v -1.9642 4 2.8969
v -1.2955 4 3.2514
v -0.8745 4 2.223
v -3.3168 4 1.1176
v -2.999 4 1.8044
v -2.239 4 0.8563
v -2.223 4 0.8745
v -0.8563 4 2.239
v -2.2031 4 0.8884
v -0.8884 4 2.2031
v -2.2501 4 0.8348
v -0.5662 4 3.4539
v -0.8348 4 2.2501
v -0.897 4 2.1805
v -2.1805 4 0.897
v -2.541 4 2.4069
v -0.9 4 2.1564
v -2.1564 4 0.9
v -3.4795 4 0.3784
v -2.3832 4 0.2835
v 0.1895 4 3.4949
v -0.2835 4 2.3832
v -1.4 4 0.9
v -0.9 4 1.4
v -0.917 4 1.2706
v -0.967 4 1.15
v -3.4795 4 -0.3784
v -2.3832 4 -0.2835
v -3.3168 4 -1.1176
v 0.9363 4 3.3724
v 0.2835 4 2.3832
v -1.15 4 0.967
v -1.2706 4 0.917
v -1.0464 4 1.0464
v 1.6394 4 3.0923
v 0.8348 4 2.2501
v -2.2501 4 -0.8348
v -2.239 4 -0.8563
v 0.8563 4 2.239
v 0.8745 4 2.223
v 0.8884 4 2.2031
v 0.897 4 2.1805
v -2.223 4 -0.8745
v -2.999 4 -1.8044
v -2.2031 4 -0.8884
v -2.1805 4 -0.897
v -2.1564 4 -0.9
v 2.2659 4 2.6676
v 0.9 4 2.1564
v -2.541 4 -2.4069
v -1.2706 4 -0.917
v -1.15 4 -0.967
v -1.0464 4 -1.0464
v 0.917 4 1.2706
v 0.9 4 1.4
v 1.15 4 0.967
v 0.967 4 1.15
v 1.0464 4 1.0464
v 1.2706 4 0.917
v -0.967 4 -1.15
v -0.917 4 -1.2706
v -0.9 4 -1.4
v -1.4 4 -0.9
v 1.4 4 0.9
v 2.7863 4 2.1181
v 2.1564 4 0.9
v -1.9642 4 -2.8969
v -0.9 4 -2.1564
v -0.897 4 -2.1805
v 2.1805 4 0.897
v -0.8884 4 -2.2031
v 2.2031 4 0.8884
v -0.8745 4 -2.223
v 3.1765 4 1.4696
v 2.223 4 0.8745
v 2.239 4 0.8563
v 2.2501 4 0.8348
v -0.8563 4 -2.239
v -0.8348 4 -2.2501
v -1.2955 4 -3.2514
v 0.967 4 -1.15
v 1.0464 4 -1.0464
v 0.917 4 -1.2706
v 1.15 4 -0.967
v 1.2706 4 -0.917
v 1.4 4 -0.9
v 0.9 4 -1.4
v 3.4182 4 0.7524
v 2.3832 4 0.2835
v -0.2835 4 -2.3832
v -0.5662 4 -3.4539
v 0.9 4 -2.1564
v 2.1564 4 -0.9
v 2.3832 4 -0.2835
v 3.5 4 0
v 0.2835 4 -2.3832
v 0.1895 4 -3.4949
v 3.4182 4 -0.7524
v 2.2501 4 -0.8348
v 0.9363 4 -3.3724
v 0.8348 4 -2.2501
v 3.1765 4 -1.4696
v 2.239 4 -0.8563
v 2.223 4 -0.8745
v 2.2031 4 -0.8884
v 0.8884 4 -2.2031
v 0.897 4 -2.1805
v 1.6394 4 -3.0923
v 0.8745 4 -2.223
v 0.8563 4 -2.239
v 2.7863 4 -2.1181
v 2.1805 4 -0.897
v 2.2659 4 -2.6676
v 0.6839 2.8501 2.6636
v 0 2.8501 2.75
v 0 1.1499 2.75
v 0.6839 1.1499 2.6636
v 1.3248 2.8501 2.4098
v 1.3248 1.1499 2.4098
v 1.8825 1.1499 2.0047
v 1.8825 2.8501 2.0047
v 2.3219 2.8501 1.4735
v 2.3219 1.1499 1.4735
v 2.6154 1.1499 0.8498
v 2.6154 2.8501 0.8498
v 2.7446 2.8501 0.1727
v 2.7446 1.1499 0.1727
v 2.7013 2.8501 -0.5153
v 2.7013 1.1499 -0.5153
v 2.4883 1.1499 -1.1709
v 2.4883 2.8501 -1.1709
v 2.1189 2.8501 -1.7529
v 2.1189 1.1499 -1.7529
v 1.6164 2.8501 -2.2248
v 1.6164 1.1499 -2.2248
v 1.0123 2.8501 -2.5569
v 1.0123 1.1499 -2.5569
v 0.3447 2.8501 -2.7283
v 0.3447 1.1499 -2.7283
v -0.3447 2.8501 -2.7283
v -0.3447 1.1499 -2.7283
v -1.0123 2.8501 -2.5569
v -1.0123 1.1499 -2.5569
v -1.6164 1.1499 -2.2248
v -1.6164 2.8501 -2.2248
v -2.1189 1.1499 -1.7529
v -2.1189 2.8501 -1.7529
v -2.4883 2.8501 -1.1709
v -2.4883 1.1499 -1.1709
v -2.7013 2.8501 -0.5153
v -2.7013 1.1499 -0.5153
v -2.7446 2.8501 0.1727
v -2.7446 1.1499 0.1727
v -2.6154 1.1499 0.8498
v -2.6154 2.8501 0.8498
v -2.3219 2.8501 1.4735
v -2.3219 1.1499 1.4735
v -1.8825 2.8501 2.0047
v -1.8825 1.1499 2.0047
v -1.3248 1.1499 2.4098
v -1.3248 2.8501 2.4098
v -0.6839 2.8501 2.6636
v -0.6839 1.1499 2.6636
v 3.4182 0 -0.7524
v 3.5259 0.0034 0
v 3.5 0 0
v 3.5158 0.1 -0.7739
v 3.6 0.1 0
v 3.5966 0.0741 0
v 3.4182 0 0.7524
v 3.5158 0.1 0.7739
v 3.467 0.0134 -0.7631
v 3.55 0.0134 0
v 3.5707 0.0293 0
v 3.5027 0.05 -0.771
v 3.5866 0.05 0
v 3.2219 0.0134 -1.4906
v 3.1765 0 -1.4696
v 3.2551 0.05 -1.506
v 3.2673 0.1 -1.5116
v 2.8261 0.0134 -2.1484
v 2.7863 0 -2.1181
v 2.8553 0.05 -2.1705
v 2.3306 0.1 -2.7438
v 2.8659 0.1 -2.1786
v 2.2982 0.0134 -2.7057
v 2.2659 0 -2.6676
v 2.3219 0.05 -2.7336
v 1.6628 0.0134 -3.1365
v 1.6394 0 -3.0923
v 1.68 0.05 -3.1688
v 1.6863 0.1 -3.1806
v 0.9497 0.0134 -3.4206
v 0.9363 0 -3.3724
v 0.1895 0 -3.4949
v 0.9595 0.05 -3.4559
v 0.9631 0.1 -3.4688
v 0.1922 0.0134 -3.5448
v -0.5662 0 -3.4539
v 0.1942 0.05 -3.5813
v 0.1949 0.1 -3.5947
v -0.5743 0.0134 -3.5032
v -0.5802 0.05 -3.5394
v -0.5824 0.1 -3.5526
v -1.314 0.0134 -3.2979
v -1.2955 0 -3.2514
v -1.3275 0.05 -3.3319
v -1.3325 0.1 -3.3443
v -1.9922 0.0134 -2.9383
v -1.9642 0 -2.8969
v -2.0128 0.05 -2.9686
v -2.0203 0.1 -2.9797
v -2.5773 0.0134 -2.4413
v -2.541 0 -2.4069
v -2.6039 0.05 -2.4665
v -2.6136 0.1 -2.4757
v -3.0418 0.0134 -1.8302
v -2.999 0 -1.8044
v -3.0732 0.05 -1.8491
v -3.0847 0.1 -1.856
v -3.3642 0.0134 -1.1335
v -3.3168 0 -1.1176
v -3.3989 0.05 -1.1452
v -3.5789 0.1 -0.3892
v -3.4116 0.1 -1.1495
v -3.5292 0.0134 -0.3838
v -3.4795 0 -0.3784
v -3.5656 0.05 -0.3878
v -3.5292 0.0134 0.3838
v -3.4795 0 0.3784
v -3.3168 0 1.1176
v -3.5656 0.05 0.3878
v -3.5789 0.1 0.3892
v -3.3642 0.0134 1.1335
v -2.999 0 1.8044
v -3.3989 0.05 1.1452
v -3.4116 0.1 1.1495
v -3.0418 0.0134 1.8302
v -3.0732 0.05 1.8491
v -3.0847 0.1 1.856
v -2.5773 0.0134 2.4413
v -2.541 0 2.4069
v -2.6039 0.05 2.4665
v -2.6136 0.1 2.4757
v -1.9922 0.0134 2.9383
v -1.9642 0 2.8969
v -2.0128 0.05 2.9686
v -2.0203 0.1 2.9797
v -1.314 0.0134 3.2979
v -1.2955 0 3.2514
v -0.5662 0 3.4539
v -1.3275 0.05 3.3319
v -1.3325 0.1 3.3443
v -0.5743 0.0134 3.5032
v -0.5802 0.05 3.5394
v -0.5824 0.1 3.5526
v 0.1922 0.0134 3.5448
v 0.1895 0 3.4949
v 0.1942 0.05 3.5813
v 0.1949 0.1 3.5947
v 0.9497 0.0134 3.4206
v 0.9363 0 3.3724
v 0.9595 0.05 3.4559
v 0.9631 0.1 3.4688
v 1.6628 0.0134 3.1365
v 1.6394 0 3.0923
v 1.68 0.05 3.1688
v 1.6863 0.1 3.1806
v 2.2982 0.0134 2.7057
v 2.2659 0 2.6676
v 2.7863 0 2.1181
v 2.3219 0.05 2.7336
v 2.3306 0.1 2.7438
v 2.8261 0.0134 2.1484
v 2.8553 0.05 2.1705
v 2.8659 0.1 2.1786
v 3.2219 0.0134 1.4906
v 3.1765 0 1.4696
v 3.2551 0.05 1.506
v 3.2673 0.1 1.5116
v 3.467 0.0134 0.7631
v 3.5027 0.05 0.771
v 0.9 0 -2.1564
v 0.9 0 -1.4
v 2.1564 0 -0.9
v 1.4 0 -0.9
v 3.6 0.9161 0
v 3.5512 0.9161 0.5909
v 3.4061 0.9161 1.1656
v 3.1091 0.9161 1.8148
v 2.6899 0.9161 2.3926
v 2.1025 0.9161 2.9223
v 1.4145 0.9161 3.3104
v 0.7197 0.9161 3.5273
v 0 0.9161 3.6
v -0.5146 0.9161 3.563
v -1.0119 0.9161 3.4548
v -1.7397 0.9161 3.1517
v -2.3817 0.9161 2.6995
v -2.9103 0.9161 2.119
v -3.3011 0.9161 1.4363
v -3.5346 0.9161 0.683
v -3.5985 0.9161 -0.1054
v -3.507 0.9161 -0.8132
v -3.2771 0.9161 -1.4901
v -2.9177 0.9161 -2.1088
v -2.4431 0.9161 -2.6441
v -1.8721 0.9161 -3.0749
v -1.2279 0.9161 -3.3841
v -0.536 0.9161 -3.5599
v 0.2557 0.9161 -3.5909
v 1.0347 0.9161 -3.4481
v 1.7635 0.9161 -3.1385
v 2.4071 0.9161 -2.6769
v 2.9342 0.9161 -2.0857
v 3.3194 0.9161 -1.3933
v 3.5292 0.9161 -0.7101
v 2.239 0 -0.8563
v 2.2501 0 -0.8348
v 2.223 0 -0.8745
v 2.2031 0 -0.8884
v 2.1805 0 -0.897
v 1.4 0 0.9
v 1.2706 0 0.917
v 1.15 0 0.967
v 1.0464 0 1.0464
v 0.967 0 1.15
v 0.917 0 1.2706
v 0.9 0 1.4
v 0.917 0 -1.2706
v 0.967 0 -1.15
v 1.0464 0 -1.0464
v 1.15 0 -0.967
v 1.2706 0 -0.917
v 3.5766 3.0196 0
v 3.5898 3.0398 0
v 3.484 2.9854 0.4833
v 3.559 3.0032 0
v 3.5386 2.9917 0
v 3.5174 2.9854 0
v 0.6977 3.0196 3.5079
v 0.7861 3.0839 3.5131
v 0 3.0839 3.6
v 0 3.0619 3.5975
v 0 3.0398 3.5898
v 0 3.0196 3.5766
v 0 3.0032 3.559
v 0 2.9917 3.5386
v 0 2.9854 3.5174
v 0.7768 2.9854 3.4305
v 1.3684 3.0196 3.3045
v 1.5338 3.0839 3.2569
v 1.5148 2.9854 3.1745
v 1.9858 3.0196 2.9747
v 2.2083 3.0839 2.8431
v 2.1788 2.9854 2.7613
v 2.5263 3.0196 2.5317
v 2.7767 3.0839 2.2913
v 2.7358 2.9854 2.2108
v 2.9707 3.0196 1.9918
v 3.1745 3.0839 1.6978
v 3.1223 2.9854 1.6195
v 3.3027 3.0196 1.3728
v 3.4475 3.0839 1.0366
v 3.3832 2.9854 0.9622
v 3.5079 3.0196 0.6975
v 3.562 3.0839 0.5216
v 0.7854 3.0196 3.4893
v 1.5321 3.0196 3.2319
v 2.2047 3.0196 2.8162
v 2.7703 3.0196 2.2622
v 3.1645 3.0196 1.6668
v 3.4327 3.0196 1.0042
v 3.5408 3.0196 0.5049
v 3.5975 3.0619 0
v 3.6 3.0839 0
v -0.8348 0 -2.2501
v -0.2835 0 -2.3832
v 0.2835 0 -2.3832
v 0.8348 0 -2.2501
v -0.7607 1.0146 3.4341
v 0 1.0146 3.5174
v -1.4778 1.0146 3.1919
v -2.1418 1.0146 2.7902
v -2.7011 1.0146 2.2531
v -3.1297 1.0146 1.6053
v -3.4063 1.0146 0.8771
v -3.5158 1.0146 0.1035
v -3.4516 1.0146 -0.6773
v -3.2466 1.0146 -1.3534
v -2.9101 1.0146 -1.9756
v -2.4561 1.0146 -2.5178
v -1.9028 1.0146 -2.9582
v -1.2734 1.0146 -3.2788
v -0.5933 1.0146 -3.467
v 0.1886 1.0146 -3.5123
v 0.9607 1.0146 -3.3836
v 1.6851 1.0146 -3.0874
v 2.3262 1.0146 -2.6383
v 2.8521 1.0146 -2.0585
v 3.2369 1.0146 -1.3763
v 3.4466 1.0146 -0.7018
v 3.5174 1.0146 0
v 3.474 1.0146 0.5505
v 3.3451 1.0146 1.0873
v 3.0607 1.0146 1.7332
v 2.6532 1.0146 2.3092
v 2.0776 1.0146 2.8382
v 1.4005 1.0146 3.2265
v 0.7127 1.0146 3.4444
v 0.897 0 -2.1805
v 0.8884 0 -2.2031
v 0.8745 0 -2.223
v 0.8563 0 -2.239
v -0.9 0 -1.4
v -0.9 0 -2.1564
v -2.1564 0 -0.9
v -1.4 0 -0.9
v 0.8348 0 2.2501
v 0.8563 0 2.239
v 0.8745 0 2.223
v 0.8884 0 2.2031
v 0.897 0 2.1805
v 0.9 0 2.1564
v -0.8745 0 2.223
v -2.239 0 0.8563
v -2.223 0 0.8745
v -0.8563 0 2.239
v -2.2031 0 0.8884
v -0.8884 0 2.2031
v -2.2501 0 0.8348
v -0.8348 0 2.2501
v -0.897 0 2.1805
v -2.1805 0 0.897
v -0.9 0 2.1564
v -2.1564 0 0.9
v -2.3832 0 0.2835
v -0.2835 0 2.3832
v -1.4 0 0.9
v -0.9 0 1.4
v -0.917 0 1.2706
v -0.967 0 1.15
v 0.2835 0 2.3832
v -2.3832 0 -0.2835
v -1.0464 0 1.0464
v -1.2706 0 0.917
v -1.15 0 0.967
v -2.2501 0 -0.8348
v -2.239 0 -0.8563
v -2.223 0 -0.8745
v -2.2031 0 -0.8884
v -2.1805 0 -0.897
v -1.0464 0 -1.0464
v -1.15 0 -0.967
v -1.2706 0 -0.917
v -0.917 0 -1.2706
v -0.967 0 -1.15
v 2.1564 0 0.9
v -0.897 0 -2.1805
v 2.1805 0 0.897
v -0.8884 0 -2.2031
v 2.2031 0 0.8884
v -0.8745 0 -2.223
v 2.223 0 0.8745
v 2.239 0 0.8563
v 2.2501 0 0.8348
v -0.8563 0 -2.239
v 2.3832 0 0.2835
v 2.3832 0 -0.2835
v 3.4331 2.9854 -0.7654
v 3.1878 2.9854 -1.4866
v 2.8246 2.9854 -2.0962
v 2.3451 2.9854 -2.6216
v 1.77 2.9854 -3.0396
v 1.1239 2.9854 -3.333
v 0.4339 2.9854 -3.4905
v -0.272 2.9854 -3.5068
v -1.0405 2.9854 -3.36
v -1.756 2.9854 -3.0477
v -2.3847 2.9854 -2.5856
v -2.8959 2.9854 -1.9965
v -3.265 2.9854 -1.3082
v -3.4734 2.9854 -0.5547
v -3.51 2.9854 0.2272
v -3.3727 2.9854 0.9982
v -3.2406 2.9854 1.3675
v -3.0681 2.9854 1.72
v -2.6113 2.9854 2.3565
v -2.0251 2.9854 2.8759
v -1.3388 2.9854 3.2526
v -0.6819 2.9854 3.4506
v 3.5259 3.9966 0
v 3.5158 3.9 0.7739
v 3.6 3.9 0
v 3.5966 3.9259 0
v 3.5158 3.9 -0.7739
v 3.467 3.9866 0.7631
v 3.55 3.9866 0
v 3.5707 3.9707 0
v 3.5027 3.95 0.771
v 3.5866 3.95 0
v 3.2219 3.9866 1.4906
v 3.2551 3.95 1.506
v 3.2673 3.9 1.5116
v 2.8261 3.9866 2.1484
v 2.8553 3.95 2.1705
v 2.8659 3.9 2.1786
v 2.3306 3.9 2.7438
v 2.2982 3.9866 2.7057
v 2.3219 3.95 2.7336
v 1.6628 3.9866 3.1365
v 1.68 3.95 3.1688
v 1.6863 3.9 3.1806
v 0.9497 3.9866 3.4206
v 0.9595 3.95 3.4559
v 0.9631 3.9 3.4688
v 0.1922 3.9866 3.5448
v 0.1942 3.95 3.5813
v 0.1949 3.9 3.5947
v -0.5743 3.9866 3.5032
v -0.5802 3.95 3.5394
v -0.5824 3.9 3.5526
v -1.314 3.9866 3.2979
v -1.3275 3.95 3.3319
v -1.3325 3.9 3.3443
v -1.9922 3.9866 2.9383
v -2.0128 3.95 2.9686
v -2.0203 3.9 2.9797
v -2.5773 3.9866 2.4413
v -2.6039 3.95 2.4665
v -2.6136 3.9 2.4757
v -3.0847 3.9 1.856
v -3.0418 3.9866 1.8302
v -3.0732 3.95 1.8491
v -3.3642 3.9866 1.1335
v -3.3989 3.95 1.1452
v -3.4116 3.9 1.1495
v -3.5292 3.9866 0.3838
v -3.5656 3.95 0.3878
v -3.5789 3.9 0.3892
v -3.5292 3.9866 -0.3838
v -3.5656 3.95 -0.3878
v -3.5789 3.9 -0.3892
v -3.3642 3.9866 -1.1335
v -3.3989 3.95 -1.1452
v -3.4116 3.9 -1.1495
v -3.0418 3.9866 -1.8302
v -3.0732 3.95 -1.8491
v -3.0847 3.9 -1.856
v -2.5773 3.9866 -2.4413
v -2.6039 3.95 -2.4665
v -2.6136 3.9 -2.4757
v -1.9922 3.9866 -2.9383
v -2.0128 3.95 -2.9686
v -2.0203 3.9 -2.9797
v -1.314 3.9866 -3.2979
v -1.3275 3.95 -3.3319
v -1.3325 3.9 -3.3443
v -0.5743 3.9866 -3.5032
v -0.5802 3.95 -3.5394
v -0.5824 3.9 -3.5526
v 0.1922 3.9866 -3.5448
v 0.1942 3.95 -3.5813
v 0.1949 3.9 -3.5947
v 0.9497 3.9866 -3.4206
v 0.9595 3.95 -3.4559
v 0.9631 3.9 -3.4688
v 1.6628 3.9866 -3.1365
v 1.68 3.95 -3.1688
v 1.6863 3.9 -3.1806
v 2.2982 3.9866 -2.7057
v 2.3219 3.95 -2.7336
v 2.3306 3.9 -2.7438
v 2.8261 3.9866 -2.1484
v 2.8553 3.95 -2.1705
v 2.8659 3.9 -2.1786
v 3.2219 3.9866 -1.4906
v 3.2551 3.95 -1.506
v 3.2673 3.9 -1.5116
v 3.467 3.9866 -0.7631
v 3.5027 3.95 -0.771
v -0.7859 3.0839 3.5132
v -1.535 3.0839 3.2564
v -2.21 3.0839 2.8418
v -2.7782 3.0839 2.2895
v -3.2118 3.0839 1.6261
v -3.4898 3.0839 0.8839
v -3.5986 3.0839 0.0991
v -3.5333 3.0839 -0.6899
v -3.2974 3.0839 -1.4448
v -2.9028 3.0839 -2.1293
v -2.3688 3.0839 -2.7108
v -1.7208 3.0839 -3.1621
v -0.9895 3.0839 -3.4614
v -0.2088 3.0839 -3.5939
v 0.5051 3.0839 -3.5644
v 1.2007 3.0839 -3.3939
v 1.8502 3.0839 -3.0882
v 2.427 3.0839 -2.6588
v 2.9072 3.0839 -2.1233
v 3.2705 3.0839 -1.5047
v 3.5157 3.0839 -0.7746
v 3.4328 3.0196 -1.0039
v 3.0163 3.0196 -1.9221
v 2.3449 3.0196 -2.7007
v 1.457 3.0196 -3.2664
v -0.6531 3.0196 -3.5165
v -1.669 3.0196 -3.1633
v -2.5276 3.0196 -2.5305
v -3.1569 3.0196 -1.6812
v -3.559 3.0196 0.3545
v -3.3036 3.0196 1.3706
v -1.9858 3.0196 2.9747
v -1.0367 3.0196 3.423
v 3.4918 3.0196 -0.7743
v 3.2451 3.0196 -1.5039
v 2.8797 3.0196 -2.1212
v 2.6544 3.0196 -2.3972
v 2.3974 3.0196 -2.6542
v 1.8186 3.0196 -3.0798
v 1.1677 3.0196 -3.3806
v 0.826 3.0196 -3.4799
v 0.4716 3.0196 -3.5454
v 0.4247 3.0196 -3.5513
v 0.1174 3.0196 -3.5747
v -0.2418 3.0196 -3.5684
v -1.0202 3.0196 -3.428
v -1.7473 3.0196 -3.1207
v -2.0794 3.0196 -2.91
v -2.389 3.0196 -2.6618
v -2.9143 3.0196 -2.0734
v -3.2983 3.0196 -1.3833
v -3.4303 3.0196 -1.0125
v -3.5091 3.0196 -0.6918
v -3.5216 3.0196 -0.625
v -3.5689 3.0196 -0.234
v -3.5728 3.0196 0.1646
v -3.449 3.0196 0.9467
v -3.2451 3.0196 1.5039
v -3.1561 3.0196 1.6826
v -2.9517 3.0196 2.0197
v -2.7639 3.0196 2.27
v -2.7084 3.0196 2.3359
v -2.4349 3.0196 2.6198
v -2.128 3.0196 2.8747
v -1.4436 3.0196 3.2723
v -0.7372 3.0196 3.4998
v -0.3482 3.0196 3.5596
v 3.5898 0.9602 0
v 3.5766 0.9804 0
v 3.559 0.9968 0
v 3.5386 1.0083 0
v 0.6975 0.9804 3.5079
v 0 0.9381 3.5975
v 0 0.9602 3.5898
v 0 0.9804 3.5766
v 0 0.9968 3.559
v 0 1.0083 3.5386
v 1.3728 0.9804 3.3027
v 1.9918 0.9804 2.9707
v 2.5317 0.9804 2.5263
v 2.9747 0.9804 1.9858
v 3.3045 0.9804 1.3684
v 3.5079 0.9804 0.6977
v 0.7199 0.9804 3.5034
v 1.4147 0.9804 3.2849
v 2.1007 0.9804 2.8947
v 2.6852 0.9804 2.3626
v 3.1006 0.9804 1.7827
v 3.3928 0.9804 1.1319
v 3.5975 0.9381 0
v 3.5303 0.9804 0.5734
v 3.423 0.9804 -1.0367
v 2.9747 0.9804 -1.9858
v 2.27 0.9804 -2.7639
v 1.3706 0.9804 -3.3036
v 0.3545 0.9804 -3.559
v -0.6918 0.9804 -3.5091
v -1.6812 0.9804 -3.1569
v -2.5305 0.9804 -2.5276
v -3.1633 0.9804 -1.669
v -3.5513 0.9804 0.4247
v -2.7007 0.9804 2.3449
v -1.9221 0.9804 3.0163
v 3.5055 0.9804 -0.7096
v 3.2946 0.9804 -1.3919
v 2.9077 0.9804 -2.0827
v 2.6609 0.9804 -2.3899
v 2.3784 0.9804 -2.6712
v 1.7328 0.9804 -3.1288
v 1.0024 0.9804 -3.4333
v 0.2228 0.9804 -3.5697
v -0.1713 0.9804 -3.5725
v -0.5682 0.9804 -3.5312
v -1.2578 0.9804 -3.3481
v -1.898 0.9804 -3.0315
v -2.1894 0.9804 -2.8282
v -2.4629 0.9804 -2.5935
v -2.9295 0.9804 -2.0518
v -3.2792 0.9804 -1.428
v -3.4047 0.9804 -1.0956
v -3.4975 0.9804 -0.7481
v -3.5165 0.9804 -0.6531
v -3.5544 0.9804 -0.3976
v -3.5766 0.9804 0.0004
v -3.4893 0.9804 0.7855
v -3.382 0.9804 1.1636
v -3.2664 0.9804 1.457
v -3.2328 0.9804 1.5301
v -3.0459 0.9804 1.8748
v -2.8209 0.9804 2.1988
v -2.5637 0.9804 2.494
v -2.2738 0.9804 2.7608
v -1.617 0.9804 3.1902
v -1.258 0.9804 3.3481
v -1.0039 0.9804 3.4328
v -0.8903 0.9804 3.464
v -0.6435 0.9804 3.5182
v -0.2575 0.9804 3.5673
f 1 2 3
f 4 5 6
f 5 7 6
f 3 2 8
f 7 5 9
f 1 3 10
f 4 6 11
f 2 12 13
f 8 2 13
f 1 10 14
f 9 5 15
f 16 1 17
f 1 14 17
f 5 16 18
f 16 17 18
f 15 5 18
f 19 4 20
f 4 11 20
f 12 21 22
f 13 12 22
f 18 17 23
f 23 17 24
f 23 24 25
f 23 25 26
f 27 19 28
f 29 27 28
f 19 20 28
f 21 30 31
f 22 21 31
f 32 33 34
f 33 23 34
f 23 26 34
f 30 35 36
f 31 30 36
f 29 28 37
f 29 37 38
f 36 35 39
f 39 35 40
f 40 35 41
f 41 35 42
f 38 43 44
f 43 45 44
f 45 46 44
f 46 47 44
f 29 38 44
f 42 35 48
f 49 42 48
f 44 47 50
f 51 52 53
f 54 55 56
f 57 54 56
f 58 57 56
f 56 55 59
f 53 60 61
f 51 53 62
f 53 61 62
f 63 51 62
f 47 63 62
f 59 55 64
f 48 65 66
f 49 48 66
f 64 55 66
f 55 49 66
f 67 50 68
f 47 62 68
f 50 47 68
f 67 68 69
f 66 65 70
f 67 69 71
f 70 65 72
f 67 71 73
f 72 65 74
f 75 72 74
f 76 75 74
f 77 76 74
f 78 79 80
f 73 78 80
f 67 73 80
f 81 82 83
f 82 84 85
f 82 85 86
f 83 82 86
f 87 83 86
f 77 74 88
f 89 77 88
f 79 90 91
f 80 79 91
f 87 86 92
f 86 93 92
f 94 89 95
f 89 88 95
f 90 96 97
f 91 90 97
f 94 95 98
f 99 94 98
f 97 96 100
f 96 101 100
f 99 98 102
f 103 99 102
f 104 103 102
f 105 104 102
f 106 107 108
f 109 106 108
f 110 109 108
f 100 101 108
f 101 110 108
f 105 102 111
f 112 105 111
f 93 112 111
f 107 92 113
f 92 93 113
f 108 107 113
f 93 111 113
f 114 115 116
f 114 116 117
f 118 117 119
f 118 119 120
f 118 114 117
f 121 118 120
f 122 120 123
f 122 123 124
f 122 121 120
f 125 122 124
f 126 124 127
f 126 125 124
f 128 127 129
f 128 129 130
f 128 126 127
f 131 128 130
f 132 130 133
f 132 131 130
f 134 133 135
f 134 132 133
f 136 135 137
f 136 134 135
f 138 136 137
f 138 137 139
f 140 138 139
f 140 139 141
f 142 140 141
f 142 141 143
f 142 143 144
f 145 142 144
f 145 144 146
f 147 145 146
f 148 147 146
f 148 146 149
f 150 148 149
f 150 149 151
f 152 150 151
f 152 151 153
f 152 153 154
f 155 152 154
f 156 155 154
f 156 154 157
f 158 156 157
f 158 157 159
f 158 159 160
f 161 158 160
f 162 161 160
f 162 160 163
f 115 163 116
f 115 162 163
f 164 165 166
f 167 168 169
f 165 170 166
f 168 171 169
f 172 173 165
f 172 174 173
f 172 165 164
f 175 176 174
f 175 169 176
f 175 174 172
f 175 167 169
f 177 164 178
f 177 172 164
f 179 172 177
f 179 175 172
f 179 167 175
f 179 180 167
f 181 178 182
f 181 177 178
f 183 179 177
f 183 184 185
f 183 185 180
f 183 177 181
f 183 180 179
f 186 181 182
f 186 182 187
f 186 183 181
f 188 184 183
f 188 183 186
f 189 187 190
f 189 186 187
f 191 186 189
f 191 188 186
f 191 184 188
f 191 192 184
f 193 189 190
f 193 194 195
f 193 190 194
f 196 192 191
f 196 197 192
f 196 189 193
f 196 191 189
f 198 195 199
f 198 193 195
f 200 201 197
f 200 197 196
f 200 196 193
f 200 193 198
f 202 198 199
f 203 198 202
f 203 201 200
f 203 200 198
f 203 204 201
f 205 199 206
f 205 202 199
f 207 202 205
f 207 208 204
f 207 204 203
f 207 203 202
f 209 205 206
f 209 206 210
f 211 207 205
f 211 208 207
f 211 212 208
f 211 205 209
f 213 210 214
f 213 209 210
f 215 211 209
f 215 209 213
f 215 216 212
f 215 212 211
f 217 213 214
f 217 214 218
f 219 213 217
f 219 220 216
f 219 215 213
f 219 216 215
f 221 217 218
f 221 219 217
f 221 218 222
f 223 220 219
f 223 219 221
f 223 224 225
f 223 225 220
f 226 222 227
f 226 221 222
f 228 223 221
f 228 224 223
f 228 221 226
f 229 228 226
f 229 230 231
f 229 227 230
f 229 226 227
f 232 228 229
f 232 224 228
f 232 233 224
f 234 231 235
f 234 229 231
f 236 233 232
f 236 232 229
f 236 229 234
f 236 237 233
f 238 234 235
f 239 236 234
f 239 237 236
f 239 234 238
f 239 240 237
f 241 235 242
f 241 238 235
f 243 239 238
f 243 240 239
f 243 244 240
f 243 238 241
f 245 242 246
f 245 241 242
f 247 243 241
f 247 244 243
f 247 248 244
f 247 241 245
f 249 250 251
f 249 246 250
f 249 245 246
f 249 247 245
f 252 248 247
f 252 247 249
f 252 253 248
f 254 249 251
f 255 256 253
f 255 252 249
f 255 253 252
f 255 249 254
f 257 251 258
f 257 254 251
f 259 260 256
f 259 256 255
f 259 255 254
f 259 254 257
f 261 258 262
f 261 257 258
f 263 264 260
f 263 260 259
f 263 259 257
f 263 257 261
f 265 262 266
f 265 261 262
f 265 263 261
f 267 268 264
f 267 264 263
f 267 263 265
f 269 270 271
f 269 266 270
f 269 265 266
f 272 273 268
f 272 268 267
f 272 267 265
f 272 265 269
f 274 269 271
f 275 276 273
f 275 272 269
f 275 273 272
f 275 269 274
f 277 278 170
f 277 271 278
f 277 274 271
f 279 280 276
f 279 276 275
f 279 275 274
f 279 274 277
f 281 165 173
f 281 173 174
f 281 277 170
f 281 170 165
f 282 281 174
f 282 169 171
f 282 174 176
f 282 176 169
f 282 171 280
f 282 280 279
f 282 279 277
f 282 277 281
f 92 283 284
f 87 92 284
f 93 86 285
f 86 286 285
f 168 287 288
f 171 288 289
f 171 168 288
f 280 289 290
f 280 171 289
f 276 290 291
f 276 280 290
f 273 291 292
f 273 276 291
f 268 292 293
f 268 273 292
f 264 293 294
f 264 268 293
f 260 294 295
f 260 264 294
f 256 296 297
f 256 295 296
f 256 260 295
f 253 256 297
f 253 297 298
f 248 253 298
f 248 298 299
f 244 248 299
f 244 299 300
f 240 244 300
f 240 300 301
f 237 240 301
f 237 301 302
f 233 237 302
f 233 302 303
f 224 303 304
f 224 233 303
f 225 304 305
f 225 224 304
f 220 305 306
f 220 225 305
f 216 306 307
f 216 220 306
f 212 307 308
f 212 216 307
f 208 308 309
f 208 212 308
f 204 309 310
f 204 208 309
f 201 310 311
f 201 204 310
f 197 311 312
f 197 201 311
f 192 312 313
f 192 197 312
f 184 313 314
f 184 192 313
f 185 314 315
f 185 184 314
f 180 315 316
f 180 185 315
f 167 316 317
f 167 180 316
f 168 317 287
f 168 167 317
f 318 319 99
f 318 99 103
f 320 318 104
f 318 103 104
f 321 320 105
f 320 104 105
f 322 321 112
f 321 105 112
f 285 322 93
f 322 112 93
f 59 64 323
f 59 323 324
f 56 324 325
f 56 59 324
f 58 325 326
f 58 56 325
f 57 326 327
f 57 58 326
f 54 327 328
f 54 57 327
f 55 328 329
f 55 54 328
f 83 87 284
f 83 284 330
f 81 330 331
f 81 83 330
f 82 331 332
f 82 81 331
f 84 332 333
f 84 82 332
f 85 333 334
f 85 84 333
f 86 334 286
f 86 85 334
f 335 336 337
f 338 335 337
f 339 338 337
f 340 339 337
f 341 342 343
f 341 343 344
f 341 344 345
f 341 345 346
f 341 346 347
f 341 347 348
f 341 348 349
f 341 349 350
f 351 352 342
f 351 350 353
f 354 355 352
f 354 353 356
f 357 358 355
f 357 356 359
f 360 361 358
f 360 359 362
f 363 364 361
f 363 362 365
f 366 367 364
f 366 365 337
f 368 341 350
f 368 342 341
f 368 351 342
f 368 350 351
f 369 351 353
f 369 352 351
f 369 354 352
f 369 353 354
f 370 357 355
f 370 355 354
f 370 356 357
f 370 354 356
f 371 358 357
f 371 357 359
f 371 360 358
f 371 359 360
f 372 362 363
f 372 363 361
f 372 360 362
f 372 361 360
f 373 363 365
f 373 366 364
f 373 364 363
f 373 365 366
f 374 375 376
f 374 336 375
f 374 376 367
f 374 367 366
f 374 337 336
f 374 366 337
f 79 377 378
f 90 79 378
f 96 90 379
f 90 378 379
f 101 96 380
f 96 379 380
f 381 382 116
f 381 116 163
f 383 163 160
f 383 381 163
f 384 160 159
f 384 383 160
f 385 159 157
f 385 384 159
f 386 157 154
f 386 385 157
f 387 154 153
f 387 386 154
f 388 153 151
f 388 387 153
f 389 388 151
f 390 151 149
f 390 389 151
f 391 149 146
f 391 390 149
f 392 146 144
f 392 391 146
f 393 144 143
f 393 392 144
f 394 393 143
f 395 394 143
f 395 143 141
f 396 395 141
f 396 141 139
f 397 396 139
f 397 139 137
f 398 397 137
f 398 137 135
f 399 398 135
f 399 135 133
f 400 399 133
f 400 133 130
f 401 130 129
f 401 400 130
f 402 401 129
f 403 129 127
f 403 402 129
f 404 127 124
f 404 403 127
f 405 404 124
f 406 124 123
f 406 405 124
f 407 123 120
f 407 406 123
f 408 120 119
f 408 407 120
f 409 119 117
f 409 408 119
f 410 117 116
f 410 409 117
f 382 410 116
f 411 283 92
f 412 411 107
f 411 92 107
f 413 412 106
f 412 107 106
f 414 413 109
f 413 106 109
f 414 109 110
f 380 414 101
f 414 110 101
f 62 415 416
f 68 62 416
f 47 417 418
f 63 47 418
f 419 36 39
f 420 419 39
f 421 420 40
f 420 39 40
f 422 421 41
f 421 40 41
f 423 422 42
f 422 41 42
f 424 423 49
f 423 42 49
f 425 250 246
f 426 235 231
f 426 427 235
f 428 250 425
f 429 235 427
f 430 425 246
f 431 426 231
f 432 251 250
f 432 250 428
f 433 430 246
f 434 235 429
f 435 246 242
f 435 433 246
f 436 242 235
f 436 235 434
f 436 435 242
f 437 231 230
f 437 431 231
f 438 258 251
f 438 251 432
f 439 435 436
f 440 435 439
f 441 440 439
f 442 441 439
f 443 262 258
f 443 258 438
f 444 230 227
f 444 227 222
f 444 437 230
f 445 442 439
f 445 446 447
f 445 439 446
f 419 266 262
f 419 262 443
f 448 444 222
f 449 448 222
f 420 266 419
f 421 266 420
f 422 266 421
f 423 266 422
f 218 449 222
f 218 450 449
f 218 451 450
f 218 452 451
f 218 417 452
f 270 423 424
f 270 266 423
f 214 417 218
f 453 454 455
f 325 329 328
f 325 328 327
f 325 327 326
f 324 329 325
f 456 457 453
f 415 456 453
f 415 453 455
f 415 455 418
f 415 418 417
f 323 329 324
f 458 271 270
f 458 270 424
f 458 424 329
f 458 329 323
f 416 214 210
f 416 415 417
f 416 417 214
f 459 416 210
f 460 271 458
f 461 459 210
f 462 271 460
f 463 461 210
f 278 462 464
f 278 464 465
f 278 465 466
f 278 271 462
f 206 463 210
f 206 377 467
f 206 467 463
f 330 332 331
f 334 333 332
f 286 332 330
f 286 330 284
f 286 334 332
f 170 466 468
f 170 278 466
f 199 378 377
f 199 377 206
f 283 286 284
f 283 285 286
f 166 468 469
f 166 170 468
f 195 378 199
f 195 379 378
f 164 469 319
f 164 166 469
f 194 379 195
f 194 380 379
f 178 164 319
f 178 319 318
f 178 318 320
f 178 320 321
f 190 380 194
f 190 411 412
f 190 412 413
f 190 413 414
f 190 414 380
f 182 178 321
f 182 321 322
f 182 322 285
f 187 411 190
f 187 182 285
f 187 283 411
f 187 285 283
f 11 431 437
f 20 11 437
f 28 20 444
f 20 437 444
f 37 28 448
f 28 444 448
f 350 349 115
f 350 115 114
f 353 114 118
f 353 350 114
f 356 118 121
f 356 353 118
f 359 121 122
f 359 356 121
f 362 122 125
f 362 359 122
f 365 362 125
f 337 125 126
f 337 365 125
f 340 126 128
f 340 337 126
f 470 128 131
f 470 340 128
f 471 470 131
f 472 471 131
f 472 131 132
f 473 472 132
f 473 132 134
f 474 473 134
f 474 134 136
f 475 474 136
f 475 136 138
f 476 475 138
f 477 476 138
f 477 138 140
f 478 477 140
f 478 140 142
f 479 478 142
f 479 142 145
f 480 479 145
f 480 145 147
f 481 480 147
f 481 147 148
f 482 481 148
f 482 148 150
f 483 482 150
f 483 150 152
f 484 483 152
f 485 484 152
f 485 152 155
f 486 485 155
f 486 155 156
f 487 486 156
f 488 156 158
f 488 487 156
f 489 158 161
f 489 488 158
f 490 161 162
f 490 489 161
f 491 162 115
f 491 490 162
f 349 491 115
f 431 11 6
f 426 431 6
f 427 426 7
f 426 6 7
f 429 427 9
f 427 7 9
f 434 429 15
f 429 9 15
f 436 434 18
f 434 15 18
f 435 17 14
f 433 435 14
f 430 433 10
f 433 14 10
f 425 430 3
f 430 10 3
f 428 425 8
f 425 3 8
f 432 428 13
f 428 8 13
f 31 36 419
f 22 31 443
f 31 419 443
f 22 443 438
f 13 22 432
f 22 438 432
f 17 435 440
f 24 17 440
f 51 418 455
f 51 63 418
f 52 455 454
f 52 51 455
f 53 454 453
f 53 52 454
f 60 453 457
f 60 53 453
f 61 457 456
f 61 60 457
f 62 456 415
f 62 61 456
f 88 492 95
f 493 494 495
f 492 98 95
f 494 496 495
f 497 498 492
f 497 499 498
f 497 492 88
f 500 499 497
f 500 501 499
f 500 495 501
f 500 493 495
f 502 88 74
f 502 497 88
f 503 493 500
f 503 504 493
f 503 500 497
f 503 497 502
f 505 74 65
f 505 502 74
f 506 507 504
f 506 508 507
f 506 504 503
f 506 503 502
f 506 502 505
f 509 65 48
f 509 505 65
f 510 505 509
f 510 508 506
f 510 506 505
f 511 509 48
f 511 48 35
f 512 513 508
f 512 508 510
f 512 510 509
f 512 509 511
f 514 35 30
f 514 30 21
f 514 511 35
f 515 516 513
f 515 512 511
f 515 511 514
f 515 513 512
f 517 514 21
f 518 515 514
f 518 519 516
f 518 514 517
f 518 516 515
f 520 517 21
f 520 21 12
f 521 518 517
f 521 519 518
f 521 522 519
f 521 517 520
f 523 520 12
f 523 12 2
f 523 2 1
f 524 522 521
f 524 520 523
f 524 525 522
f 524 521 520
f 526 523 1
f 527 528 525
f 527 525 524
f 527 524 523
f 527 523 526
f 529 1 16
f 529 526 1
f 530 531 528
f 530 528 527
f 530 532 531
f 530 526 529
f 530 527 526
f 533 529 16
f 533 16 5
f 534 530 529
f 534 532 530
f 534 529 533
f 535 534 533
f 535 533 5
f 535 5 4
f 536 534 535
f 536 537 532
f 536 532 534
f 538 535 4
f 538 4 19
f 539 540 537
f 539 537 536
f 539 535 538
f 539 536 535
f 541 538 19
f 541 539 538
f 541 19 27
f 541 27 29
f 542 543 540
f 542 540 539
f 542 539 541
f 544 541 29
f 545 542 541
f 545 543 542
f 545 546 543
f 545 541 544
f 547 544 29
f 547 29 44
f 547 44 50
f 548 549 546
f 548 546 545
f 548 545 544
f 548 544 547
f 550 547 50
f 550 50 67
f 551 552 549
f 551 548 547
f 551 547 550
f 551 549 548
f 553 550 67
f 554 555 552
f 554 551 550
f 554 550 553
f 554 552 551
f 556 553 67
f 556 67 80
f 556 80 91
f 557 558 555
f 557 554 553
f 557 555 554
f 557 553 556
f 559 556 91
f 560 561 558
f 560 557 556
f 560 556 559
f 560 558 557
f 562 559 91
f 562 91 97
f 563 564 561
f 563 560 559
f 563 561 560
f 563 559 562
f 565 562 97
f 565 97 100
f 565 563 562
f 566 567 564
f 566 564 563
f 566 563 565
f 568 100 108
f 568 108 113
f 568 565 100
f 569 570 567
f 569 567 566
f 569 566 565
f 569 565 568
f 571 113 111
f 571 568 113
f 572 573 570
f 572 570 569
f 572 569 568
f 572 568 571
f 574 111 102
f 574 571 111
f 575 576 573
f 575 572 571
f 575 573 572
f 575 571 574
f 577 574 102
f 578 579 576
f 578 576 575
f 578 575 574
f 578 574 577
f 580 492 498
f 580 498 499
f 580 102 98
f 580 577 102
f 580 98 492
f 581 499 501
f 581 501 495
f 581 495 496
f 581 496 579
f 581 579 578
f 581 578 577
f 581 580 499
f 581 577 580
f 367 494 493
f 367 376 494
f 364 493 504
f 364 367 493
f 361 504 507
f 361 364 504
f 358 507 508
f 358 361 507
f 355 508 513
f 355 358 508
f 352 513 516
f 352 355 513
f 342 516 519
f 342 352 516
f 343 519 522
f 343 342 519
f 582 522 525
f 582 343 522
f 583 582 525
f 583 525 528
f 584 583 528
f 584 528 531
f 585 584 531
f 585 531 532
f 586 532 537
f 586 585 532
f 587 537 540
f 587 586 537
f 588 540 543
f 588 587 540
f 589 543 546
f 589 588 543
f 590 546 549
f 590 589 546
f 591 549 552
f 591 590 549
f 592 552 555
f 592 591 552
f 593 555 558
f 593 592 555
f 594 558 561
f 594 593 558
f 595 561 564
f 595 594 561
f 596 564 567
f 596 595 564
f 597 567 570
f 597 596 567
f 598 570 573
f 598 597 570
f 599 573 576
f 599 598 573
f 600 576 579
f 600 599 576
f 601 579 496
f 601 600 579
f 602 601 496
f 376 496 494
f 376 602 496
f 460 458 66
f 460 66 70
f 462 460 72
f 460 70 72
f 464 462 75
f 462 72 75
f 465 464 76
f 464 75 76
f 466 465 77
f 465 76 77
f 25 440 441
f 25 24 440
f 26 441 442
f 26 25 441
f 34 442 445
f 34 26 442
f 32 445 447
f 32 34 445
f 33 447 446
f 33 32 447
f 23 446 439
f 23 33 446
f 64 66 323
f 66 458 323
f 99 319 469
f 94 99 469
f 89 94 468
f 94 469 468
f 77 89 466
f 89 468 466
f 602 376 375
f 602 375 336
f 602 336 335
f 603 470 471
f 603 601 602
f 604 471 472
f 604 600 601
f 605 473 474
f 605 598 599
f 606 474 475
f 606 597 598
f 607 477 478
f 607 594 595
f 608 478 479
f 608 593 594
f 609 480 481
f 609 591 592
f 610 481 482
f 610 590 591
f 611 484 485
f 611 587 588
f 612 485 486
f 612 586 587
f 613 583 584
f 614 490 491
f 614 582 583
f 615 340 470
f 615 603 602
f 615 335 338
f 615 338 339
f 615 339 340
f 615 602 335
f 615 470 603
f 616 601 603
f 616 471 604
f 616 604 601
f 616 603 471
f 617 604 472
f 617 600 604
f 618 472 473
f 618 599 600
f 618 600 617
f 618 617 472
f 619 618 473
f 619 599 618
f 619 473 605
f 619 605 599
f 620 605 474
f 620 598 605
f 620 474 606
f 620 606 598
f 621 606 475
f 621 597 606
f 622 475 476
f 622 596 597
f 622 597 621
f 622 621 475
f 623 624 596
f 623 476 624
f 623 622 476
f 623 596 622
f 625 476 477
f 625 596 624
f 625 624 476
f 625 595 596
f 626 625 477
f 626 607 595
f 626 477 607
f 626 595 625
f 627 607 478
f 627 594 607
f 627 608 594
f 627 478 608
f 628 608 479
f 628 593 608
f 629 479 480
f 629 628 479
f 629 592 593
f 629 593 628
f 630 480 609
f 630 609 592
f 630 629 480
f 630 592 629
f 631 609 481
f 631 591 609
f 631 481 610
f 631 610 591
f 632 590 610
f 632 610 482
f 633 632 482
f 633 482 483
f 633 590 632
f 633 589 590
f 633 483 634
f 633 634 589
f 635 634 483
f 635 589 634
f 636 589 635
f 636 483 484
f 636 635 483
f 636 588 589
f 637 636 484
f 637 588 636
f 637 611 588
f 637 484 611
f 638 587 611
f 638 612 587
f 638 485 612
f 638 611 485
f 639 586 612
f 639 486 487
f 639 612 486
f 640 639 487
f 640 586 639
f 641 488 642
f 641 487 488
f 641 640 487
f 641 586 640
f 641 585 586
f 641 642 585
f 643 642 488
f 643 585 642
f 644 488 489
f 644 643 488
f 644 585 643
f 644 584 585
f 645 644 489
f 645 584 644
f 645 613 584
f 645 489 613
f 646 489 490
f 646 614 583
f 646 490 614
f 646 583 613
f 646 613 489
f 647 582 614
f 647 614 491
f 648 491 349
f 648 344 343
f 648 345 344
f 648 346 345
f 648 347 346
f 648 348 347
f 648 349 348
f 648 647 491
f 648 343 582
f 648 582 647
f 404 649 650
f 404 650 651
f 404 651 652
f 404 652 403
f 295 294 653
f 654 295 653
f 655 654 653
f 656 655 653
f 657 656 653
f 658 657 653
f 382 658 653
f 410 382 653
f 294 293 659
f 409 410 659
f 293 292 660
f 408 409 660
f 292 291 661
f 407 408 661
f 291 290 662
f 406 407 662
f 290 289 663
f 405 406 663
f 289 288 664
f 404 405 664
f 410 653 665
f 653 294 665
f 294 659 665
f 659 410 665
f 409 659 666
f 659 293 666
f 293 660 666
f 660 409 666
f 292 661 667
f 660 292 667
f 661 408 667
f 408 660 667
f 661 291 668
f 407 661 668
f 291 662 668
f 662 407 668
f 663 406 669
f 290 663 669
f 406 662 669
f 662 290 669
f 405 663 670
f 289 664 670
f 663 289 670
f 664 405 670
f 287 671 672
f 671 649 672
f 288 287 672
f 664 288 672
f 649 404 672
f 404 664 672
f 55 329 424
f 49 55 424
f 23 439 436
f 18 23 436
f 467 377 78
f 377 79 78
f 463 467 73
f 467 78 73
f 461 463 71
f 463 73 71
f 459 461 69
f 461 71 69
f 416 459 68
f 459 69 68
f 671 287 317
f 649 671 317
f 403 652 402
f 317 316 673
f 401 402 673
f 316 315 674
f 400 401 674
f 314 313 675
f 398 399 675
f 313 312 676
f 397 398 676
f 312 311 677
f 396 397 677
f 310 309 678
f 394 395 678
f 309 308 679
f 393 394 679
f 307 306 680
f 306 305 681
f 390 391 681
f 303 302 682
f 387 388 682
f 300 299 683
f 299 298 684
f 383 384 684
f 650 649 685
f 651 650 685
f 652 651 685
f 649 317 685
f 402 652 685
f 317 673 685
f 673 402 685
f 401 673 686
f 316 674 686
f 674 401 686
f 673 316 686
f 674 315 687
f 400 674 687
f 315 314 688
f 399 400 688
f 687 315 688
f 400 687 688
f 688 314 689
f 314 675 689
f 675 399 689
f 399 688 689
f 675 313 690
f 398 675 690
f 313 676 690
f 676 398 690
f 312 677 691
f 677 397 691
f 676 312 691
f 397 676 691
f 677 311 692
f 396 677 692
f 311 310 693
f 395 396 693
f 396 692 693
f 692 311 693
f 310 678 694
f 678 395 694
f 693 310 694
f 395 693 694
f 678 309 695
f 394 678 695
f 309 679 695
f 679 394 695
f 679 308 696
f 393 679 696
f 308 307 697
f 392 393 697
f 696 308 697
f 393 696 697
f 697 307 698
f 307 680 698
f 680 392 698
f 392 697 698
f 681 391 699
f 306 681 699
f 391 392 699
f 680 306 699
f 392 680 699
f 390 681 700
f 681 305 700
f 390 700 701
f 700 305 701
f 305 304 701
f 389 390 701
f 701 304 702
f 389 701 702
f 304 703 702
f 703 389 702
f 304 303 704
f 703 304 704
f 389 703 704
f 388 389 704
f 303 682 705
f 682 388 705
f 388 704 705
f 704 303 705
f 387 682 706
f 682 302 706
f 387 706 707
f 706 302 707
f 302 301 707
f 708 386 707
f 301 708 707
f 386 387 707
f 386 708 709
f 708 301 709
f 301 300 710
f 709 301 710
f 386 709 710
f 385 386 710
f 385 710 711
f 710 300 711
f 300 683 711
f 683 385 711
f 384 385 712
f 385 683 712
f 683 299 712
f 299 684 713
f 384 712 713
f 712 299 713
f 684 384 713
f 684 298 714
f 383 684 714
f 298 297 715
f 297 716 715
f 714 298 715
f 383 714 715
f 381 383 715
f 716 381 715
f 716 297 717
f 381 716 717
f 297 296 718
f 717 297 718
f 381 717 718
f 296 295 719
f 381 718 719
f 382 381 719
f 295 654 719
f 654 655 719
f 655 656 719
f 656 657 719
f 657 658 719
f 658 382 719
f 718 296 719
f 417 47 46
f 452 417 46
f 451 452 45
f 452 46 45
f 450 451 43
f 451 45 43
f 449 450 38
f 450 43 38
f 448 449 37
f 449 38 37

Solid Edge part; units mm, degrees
sketch "Sketch1" plane through (0, 0, 0) normal (0, -1, 0) x (1, 0, 0)
  circle A0 centre (0, 0) radius 3.6
extrude "Protrusion1" add sketch "Sketch1" against normal blind 4
sketch "Sketch2" plane through (0, 0, 0) normal (0, -1, 0) x (1, 0, 0)
  line L0 (0.9, 0.9) -> (0.9, 2.2249)
  arc A0 (-0.9, 2.2249) -> (0.9, 2.2249) centre (0, 0) cw
  line L1 (-0.9, 2.2249) -> (-0.9, 0.9)
  line L2 (-0.9, 0.9) -> (-2.2249, 0.9)
  line L3 (-2.2249, -0.9) -> (-0.9, -0.9)
  line L4 (-0.9, -0.9) -> (-0.9, -2.2249)
  arc A1 (0.9, -2.2249) -> (-0.9, -2.2249) centre (0, 0) cw
  line L5 (0.9, -2.2249) -> (0.9, -0.9)
  line L6 (0.9, -0.9) -> (2.2249, -0.9)
  arc A2 (2.2249, 0.9) -> (2.2249, -0.9) centre (0, 0) cw
  line L7 (2.2249, 0.9) -> (0.9, 0.9)
  arc A3 (-2.2249, -0.9) -> (-2.2249, 0.9) centre (0, 0) cw
extrude "ExtrudedCutout_1" cut sketch "Sketch2" against normal blind 15
fillet "Round1" radius 0.5 4 edges at (-0.9, 2, 0.9) (-0.9, 2, -0.9) (0.9, 2, -0.9) (0.9, 2, 0.9)
fillet "Round_5" radius 0.1 8 edges at (-0.9, 2, 2.2249) (-2.2249, 2, 0.9) (0.9, 2, 2.2249) (2.2249, 2, 0.9) (2.2249, 2, -0.9) (0.9, 2, -2.2249) (-0.9, 2, -2.2249) (-2.2249, 2, -0.9)
sketch "Sketch3" plane through (0, 0, 0) normal (1, 0, 0) x (0, 1, 0)
  line L0 (1.1499, 2.75) -> (2.8501, 2.75)
  line L1 (3, 3.6) -> (2.8501, 2.75)
  line L2 (1, 3.6) -> (3, 3.6)
  line L3 (1, 3.6) -> (1.1499, 2.75)
revolve "RevolvedCutout1" cut sketch "Sketch3" angle 360 about axis through (0, -60, 0) along (0, 1, 0)
fillet "Round2" radius 0.1 4 edges at (0, 1, 3.6) (0, 3, 3.6) (-3.6, 4, 0) (-3.6, 0, 0)
